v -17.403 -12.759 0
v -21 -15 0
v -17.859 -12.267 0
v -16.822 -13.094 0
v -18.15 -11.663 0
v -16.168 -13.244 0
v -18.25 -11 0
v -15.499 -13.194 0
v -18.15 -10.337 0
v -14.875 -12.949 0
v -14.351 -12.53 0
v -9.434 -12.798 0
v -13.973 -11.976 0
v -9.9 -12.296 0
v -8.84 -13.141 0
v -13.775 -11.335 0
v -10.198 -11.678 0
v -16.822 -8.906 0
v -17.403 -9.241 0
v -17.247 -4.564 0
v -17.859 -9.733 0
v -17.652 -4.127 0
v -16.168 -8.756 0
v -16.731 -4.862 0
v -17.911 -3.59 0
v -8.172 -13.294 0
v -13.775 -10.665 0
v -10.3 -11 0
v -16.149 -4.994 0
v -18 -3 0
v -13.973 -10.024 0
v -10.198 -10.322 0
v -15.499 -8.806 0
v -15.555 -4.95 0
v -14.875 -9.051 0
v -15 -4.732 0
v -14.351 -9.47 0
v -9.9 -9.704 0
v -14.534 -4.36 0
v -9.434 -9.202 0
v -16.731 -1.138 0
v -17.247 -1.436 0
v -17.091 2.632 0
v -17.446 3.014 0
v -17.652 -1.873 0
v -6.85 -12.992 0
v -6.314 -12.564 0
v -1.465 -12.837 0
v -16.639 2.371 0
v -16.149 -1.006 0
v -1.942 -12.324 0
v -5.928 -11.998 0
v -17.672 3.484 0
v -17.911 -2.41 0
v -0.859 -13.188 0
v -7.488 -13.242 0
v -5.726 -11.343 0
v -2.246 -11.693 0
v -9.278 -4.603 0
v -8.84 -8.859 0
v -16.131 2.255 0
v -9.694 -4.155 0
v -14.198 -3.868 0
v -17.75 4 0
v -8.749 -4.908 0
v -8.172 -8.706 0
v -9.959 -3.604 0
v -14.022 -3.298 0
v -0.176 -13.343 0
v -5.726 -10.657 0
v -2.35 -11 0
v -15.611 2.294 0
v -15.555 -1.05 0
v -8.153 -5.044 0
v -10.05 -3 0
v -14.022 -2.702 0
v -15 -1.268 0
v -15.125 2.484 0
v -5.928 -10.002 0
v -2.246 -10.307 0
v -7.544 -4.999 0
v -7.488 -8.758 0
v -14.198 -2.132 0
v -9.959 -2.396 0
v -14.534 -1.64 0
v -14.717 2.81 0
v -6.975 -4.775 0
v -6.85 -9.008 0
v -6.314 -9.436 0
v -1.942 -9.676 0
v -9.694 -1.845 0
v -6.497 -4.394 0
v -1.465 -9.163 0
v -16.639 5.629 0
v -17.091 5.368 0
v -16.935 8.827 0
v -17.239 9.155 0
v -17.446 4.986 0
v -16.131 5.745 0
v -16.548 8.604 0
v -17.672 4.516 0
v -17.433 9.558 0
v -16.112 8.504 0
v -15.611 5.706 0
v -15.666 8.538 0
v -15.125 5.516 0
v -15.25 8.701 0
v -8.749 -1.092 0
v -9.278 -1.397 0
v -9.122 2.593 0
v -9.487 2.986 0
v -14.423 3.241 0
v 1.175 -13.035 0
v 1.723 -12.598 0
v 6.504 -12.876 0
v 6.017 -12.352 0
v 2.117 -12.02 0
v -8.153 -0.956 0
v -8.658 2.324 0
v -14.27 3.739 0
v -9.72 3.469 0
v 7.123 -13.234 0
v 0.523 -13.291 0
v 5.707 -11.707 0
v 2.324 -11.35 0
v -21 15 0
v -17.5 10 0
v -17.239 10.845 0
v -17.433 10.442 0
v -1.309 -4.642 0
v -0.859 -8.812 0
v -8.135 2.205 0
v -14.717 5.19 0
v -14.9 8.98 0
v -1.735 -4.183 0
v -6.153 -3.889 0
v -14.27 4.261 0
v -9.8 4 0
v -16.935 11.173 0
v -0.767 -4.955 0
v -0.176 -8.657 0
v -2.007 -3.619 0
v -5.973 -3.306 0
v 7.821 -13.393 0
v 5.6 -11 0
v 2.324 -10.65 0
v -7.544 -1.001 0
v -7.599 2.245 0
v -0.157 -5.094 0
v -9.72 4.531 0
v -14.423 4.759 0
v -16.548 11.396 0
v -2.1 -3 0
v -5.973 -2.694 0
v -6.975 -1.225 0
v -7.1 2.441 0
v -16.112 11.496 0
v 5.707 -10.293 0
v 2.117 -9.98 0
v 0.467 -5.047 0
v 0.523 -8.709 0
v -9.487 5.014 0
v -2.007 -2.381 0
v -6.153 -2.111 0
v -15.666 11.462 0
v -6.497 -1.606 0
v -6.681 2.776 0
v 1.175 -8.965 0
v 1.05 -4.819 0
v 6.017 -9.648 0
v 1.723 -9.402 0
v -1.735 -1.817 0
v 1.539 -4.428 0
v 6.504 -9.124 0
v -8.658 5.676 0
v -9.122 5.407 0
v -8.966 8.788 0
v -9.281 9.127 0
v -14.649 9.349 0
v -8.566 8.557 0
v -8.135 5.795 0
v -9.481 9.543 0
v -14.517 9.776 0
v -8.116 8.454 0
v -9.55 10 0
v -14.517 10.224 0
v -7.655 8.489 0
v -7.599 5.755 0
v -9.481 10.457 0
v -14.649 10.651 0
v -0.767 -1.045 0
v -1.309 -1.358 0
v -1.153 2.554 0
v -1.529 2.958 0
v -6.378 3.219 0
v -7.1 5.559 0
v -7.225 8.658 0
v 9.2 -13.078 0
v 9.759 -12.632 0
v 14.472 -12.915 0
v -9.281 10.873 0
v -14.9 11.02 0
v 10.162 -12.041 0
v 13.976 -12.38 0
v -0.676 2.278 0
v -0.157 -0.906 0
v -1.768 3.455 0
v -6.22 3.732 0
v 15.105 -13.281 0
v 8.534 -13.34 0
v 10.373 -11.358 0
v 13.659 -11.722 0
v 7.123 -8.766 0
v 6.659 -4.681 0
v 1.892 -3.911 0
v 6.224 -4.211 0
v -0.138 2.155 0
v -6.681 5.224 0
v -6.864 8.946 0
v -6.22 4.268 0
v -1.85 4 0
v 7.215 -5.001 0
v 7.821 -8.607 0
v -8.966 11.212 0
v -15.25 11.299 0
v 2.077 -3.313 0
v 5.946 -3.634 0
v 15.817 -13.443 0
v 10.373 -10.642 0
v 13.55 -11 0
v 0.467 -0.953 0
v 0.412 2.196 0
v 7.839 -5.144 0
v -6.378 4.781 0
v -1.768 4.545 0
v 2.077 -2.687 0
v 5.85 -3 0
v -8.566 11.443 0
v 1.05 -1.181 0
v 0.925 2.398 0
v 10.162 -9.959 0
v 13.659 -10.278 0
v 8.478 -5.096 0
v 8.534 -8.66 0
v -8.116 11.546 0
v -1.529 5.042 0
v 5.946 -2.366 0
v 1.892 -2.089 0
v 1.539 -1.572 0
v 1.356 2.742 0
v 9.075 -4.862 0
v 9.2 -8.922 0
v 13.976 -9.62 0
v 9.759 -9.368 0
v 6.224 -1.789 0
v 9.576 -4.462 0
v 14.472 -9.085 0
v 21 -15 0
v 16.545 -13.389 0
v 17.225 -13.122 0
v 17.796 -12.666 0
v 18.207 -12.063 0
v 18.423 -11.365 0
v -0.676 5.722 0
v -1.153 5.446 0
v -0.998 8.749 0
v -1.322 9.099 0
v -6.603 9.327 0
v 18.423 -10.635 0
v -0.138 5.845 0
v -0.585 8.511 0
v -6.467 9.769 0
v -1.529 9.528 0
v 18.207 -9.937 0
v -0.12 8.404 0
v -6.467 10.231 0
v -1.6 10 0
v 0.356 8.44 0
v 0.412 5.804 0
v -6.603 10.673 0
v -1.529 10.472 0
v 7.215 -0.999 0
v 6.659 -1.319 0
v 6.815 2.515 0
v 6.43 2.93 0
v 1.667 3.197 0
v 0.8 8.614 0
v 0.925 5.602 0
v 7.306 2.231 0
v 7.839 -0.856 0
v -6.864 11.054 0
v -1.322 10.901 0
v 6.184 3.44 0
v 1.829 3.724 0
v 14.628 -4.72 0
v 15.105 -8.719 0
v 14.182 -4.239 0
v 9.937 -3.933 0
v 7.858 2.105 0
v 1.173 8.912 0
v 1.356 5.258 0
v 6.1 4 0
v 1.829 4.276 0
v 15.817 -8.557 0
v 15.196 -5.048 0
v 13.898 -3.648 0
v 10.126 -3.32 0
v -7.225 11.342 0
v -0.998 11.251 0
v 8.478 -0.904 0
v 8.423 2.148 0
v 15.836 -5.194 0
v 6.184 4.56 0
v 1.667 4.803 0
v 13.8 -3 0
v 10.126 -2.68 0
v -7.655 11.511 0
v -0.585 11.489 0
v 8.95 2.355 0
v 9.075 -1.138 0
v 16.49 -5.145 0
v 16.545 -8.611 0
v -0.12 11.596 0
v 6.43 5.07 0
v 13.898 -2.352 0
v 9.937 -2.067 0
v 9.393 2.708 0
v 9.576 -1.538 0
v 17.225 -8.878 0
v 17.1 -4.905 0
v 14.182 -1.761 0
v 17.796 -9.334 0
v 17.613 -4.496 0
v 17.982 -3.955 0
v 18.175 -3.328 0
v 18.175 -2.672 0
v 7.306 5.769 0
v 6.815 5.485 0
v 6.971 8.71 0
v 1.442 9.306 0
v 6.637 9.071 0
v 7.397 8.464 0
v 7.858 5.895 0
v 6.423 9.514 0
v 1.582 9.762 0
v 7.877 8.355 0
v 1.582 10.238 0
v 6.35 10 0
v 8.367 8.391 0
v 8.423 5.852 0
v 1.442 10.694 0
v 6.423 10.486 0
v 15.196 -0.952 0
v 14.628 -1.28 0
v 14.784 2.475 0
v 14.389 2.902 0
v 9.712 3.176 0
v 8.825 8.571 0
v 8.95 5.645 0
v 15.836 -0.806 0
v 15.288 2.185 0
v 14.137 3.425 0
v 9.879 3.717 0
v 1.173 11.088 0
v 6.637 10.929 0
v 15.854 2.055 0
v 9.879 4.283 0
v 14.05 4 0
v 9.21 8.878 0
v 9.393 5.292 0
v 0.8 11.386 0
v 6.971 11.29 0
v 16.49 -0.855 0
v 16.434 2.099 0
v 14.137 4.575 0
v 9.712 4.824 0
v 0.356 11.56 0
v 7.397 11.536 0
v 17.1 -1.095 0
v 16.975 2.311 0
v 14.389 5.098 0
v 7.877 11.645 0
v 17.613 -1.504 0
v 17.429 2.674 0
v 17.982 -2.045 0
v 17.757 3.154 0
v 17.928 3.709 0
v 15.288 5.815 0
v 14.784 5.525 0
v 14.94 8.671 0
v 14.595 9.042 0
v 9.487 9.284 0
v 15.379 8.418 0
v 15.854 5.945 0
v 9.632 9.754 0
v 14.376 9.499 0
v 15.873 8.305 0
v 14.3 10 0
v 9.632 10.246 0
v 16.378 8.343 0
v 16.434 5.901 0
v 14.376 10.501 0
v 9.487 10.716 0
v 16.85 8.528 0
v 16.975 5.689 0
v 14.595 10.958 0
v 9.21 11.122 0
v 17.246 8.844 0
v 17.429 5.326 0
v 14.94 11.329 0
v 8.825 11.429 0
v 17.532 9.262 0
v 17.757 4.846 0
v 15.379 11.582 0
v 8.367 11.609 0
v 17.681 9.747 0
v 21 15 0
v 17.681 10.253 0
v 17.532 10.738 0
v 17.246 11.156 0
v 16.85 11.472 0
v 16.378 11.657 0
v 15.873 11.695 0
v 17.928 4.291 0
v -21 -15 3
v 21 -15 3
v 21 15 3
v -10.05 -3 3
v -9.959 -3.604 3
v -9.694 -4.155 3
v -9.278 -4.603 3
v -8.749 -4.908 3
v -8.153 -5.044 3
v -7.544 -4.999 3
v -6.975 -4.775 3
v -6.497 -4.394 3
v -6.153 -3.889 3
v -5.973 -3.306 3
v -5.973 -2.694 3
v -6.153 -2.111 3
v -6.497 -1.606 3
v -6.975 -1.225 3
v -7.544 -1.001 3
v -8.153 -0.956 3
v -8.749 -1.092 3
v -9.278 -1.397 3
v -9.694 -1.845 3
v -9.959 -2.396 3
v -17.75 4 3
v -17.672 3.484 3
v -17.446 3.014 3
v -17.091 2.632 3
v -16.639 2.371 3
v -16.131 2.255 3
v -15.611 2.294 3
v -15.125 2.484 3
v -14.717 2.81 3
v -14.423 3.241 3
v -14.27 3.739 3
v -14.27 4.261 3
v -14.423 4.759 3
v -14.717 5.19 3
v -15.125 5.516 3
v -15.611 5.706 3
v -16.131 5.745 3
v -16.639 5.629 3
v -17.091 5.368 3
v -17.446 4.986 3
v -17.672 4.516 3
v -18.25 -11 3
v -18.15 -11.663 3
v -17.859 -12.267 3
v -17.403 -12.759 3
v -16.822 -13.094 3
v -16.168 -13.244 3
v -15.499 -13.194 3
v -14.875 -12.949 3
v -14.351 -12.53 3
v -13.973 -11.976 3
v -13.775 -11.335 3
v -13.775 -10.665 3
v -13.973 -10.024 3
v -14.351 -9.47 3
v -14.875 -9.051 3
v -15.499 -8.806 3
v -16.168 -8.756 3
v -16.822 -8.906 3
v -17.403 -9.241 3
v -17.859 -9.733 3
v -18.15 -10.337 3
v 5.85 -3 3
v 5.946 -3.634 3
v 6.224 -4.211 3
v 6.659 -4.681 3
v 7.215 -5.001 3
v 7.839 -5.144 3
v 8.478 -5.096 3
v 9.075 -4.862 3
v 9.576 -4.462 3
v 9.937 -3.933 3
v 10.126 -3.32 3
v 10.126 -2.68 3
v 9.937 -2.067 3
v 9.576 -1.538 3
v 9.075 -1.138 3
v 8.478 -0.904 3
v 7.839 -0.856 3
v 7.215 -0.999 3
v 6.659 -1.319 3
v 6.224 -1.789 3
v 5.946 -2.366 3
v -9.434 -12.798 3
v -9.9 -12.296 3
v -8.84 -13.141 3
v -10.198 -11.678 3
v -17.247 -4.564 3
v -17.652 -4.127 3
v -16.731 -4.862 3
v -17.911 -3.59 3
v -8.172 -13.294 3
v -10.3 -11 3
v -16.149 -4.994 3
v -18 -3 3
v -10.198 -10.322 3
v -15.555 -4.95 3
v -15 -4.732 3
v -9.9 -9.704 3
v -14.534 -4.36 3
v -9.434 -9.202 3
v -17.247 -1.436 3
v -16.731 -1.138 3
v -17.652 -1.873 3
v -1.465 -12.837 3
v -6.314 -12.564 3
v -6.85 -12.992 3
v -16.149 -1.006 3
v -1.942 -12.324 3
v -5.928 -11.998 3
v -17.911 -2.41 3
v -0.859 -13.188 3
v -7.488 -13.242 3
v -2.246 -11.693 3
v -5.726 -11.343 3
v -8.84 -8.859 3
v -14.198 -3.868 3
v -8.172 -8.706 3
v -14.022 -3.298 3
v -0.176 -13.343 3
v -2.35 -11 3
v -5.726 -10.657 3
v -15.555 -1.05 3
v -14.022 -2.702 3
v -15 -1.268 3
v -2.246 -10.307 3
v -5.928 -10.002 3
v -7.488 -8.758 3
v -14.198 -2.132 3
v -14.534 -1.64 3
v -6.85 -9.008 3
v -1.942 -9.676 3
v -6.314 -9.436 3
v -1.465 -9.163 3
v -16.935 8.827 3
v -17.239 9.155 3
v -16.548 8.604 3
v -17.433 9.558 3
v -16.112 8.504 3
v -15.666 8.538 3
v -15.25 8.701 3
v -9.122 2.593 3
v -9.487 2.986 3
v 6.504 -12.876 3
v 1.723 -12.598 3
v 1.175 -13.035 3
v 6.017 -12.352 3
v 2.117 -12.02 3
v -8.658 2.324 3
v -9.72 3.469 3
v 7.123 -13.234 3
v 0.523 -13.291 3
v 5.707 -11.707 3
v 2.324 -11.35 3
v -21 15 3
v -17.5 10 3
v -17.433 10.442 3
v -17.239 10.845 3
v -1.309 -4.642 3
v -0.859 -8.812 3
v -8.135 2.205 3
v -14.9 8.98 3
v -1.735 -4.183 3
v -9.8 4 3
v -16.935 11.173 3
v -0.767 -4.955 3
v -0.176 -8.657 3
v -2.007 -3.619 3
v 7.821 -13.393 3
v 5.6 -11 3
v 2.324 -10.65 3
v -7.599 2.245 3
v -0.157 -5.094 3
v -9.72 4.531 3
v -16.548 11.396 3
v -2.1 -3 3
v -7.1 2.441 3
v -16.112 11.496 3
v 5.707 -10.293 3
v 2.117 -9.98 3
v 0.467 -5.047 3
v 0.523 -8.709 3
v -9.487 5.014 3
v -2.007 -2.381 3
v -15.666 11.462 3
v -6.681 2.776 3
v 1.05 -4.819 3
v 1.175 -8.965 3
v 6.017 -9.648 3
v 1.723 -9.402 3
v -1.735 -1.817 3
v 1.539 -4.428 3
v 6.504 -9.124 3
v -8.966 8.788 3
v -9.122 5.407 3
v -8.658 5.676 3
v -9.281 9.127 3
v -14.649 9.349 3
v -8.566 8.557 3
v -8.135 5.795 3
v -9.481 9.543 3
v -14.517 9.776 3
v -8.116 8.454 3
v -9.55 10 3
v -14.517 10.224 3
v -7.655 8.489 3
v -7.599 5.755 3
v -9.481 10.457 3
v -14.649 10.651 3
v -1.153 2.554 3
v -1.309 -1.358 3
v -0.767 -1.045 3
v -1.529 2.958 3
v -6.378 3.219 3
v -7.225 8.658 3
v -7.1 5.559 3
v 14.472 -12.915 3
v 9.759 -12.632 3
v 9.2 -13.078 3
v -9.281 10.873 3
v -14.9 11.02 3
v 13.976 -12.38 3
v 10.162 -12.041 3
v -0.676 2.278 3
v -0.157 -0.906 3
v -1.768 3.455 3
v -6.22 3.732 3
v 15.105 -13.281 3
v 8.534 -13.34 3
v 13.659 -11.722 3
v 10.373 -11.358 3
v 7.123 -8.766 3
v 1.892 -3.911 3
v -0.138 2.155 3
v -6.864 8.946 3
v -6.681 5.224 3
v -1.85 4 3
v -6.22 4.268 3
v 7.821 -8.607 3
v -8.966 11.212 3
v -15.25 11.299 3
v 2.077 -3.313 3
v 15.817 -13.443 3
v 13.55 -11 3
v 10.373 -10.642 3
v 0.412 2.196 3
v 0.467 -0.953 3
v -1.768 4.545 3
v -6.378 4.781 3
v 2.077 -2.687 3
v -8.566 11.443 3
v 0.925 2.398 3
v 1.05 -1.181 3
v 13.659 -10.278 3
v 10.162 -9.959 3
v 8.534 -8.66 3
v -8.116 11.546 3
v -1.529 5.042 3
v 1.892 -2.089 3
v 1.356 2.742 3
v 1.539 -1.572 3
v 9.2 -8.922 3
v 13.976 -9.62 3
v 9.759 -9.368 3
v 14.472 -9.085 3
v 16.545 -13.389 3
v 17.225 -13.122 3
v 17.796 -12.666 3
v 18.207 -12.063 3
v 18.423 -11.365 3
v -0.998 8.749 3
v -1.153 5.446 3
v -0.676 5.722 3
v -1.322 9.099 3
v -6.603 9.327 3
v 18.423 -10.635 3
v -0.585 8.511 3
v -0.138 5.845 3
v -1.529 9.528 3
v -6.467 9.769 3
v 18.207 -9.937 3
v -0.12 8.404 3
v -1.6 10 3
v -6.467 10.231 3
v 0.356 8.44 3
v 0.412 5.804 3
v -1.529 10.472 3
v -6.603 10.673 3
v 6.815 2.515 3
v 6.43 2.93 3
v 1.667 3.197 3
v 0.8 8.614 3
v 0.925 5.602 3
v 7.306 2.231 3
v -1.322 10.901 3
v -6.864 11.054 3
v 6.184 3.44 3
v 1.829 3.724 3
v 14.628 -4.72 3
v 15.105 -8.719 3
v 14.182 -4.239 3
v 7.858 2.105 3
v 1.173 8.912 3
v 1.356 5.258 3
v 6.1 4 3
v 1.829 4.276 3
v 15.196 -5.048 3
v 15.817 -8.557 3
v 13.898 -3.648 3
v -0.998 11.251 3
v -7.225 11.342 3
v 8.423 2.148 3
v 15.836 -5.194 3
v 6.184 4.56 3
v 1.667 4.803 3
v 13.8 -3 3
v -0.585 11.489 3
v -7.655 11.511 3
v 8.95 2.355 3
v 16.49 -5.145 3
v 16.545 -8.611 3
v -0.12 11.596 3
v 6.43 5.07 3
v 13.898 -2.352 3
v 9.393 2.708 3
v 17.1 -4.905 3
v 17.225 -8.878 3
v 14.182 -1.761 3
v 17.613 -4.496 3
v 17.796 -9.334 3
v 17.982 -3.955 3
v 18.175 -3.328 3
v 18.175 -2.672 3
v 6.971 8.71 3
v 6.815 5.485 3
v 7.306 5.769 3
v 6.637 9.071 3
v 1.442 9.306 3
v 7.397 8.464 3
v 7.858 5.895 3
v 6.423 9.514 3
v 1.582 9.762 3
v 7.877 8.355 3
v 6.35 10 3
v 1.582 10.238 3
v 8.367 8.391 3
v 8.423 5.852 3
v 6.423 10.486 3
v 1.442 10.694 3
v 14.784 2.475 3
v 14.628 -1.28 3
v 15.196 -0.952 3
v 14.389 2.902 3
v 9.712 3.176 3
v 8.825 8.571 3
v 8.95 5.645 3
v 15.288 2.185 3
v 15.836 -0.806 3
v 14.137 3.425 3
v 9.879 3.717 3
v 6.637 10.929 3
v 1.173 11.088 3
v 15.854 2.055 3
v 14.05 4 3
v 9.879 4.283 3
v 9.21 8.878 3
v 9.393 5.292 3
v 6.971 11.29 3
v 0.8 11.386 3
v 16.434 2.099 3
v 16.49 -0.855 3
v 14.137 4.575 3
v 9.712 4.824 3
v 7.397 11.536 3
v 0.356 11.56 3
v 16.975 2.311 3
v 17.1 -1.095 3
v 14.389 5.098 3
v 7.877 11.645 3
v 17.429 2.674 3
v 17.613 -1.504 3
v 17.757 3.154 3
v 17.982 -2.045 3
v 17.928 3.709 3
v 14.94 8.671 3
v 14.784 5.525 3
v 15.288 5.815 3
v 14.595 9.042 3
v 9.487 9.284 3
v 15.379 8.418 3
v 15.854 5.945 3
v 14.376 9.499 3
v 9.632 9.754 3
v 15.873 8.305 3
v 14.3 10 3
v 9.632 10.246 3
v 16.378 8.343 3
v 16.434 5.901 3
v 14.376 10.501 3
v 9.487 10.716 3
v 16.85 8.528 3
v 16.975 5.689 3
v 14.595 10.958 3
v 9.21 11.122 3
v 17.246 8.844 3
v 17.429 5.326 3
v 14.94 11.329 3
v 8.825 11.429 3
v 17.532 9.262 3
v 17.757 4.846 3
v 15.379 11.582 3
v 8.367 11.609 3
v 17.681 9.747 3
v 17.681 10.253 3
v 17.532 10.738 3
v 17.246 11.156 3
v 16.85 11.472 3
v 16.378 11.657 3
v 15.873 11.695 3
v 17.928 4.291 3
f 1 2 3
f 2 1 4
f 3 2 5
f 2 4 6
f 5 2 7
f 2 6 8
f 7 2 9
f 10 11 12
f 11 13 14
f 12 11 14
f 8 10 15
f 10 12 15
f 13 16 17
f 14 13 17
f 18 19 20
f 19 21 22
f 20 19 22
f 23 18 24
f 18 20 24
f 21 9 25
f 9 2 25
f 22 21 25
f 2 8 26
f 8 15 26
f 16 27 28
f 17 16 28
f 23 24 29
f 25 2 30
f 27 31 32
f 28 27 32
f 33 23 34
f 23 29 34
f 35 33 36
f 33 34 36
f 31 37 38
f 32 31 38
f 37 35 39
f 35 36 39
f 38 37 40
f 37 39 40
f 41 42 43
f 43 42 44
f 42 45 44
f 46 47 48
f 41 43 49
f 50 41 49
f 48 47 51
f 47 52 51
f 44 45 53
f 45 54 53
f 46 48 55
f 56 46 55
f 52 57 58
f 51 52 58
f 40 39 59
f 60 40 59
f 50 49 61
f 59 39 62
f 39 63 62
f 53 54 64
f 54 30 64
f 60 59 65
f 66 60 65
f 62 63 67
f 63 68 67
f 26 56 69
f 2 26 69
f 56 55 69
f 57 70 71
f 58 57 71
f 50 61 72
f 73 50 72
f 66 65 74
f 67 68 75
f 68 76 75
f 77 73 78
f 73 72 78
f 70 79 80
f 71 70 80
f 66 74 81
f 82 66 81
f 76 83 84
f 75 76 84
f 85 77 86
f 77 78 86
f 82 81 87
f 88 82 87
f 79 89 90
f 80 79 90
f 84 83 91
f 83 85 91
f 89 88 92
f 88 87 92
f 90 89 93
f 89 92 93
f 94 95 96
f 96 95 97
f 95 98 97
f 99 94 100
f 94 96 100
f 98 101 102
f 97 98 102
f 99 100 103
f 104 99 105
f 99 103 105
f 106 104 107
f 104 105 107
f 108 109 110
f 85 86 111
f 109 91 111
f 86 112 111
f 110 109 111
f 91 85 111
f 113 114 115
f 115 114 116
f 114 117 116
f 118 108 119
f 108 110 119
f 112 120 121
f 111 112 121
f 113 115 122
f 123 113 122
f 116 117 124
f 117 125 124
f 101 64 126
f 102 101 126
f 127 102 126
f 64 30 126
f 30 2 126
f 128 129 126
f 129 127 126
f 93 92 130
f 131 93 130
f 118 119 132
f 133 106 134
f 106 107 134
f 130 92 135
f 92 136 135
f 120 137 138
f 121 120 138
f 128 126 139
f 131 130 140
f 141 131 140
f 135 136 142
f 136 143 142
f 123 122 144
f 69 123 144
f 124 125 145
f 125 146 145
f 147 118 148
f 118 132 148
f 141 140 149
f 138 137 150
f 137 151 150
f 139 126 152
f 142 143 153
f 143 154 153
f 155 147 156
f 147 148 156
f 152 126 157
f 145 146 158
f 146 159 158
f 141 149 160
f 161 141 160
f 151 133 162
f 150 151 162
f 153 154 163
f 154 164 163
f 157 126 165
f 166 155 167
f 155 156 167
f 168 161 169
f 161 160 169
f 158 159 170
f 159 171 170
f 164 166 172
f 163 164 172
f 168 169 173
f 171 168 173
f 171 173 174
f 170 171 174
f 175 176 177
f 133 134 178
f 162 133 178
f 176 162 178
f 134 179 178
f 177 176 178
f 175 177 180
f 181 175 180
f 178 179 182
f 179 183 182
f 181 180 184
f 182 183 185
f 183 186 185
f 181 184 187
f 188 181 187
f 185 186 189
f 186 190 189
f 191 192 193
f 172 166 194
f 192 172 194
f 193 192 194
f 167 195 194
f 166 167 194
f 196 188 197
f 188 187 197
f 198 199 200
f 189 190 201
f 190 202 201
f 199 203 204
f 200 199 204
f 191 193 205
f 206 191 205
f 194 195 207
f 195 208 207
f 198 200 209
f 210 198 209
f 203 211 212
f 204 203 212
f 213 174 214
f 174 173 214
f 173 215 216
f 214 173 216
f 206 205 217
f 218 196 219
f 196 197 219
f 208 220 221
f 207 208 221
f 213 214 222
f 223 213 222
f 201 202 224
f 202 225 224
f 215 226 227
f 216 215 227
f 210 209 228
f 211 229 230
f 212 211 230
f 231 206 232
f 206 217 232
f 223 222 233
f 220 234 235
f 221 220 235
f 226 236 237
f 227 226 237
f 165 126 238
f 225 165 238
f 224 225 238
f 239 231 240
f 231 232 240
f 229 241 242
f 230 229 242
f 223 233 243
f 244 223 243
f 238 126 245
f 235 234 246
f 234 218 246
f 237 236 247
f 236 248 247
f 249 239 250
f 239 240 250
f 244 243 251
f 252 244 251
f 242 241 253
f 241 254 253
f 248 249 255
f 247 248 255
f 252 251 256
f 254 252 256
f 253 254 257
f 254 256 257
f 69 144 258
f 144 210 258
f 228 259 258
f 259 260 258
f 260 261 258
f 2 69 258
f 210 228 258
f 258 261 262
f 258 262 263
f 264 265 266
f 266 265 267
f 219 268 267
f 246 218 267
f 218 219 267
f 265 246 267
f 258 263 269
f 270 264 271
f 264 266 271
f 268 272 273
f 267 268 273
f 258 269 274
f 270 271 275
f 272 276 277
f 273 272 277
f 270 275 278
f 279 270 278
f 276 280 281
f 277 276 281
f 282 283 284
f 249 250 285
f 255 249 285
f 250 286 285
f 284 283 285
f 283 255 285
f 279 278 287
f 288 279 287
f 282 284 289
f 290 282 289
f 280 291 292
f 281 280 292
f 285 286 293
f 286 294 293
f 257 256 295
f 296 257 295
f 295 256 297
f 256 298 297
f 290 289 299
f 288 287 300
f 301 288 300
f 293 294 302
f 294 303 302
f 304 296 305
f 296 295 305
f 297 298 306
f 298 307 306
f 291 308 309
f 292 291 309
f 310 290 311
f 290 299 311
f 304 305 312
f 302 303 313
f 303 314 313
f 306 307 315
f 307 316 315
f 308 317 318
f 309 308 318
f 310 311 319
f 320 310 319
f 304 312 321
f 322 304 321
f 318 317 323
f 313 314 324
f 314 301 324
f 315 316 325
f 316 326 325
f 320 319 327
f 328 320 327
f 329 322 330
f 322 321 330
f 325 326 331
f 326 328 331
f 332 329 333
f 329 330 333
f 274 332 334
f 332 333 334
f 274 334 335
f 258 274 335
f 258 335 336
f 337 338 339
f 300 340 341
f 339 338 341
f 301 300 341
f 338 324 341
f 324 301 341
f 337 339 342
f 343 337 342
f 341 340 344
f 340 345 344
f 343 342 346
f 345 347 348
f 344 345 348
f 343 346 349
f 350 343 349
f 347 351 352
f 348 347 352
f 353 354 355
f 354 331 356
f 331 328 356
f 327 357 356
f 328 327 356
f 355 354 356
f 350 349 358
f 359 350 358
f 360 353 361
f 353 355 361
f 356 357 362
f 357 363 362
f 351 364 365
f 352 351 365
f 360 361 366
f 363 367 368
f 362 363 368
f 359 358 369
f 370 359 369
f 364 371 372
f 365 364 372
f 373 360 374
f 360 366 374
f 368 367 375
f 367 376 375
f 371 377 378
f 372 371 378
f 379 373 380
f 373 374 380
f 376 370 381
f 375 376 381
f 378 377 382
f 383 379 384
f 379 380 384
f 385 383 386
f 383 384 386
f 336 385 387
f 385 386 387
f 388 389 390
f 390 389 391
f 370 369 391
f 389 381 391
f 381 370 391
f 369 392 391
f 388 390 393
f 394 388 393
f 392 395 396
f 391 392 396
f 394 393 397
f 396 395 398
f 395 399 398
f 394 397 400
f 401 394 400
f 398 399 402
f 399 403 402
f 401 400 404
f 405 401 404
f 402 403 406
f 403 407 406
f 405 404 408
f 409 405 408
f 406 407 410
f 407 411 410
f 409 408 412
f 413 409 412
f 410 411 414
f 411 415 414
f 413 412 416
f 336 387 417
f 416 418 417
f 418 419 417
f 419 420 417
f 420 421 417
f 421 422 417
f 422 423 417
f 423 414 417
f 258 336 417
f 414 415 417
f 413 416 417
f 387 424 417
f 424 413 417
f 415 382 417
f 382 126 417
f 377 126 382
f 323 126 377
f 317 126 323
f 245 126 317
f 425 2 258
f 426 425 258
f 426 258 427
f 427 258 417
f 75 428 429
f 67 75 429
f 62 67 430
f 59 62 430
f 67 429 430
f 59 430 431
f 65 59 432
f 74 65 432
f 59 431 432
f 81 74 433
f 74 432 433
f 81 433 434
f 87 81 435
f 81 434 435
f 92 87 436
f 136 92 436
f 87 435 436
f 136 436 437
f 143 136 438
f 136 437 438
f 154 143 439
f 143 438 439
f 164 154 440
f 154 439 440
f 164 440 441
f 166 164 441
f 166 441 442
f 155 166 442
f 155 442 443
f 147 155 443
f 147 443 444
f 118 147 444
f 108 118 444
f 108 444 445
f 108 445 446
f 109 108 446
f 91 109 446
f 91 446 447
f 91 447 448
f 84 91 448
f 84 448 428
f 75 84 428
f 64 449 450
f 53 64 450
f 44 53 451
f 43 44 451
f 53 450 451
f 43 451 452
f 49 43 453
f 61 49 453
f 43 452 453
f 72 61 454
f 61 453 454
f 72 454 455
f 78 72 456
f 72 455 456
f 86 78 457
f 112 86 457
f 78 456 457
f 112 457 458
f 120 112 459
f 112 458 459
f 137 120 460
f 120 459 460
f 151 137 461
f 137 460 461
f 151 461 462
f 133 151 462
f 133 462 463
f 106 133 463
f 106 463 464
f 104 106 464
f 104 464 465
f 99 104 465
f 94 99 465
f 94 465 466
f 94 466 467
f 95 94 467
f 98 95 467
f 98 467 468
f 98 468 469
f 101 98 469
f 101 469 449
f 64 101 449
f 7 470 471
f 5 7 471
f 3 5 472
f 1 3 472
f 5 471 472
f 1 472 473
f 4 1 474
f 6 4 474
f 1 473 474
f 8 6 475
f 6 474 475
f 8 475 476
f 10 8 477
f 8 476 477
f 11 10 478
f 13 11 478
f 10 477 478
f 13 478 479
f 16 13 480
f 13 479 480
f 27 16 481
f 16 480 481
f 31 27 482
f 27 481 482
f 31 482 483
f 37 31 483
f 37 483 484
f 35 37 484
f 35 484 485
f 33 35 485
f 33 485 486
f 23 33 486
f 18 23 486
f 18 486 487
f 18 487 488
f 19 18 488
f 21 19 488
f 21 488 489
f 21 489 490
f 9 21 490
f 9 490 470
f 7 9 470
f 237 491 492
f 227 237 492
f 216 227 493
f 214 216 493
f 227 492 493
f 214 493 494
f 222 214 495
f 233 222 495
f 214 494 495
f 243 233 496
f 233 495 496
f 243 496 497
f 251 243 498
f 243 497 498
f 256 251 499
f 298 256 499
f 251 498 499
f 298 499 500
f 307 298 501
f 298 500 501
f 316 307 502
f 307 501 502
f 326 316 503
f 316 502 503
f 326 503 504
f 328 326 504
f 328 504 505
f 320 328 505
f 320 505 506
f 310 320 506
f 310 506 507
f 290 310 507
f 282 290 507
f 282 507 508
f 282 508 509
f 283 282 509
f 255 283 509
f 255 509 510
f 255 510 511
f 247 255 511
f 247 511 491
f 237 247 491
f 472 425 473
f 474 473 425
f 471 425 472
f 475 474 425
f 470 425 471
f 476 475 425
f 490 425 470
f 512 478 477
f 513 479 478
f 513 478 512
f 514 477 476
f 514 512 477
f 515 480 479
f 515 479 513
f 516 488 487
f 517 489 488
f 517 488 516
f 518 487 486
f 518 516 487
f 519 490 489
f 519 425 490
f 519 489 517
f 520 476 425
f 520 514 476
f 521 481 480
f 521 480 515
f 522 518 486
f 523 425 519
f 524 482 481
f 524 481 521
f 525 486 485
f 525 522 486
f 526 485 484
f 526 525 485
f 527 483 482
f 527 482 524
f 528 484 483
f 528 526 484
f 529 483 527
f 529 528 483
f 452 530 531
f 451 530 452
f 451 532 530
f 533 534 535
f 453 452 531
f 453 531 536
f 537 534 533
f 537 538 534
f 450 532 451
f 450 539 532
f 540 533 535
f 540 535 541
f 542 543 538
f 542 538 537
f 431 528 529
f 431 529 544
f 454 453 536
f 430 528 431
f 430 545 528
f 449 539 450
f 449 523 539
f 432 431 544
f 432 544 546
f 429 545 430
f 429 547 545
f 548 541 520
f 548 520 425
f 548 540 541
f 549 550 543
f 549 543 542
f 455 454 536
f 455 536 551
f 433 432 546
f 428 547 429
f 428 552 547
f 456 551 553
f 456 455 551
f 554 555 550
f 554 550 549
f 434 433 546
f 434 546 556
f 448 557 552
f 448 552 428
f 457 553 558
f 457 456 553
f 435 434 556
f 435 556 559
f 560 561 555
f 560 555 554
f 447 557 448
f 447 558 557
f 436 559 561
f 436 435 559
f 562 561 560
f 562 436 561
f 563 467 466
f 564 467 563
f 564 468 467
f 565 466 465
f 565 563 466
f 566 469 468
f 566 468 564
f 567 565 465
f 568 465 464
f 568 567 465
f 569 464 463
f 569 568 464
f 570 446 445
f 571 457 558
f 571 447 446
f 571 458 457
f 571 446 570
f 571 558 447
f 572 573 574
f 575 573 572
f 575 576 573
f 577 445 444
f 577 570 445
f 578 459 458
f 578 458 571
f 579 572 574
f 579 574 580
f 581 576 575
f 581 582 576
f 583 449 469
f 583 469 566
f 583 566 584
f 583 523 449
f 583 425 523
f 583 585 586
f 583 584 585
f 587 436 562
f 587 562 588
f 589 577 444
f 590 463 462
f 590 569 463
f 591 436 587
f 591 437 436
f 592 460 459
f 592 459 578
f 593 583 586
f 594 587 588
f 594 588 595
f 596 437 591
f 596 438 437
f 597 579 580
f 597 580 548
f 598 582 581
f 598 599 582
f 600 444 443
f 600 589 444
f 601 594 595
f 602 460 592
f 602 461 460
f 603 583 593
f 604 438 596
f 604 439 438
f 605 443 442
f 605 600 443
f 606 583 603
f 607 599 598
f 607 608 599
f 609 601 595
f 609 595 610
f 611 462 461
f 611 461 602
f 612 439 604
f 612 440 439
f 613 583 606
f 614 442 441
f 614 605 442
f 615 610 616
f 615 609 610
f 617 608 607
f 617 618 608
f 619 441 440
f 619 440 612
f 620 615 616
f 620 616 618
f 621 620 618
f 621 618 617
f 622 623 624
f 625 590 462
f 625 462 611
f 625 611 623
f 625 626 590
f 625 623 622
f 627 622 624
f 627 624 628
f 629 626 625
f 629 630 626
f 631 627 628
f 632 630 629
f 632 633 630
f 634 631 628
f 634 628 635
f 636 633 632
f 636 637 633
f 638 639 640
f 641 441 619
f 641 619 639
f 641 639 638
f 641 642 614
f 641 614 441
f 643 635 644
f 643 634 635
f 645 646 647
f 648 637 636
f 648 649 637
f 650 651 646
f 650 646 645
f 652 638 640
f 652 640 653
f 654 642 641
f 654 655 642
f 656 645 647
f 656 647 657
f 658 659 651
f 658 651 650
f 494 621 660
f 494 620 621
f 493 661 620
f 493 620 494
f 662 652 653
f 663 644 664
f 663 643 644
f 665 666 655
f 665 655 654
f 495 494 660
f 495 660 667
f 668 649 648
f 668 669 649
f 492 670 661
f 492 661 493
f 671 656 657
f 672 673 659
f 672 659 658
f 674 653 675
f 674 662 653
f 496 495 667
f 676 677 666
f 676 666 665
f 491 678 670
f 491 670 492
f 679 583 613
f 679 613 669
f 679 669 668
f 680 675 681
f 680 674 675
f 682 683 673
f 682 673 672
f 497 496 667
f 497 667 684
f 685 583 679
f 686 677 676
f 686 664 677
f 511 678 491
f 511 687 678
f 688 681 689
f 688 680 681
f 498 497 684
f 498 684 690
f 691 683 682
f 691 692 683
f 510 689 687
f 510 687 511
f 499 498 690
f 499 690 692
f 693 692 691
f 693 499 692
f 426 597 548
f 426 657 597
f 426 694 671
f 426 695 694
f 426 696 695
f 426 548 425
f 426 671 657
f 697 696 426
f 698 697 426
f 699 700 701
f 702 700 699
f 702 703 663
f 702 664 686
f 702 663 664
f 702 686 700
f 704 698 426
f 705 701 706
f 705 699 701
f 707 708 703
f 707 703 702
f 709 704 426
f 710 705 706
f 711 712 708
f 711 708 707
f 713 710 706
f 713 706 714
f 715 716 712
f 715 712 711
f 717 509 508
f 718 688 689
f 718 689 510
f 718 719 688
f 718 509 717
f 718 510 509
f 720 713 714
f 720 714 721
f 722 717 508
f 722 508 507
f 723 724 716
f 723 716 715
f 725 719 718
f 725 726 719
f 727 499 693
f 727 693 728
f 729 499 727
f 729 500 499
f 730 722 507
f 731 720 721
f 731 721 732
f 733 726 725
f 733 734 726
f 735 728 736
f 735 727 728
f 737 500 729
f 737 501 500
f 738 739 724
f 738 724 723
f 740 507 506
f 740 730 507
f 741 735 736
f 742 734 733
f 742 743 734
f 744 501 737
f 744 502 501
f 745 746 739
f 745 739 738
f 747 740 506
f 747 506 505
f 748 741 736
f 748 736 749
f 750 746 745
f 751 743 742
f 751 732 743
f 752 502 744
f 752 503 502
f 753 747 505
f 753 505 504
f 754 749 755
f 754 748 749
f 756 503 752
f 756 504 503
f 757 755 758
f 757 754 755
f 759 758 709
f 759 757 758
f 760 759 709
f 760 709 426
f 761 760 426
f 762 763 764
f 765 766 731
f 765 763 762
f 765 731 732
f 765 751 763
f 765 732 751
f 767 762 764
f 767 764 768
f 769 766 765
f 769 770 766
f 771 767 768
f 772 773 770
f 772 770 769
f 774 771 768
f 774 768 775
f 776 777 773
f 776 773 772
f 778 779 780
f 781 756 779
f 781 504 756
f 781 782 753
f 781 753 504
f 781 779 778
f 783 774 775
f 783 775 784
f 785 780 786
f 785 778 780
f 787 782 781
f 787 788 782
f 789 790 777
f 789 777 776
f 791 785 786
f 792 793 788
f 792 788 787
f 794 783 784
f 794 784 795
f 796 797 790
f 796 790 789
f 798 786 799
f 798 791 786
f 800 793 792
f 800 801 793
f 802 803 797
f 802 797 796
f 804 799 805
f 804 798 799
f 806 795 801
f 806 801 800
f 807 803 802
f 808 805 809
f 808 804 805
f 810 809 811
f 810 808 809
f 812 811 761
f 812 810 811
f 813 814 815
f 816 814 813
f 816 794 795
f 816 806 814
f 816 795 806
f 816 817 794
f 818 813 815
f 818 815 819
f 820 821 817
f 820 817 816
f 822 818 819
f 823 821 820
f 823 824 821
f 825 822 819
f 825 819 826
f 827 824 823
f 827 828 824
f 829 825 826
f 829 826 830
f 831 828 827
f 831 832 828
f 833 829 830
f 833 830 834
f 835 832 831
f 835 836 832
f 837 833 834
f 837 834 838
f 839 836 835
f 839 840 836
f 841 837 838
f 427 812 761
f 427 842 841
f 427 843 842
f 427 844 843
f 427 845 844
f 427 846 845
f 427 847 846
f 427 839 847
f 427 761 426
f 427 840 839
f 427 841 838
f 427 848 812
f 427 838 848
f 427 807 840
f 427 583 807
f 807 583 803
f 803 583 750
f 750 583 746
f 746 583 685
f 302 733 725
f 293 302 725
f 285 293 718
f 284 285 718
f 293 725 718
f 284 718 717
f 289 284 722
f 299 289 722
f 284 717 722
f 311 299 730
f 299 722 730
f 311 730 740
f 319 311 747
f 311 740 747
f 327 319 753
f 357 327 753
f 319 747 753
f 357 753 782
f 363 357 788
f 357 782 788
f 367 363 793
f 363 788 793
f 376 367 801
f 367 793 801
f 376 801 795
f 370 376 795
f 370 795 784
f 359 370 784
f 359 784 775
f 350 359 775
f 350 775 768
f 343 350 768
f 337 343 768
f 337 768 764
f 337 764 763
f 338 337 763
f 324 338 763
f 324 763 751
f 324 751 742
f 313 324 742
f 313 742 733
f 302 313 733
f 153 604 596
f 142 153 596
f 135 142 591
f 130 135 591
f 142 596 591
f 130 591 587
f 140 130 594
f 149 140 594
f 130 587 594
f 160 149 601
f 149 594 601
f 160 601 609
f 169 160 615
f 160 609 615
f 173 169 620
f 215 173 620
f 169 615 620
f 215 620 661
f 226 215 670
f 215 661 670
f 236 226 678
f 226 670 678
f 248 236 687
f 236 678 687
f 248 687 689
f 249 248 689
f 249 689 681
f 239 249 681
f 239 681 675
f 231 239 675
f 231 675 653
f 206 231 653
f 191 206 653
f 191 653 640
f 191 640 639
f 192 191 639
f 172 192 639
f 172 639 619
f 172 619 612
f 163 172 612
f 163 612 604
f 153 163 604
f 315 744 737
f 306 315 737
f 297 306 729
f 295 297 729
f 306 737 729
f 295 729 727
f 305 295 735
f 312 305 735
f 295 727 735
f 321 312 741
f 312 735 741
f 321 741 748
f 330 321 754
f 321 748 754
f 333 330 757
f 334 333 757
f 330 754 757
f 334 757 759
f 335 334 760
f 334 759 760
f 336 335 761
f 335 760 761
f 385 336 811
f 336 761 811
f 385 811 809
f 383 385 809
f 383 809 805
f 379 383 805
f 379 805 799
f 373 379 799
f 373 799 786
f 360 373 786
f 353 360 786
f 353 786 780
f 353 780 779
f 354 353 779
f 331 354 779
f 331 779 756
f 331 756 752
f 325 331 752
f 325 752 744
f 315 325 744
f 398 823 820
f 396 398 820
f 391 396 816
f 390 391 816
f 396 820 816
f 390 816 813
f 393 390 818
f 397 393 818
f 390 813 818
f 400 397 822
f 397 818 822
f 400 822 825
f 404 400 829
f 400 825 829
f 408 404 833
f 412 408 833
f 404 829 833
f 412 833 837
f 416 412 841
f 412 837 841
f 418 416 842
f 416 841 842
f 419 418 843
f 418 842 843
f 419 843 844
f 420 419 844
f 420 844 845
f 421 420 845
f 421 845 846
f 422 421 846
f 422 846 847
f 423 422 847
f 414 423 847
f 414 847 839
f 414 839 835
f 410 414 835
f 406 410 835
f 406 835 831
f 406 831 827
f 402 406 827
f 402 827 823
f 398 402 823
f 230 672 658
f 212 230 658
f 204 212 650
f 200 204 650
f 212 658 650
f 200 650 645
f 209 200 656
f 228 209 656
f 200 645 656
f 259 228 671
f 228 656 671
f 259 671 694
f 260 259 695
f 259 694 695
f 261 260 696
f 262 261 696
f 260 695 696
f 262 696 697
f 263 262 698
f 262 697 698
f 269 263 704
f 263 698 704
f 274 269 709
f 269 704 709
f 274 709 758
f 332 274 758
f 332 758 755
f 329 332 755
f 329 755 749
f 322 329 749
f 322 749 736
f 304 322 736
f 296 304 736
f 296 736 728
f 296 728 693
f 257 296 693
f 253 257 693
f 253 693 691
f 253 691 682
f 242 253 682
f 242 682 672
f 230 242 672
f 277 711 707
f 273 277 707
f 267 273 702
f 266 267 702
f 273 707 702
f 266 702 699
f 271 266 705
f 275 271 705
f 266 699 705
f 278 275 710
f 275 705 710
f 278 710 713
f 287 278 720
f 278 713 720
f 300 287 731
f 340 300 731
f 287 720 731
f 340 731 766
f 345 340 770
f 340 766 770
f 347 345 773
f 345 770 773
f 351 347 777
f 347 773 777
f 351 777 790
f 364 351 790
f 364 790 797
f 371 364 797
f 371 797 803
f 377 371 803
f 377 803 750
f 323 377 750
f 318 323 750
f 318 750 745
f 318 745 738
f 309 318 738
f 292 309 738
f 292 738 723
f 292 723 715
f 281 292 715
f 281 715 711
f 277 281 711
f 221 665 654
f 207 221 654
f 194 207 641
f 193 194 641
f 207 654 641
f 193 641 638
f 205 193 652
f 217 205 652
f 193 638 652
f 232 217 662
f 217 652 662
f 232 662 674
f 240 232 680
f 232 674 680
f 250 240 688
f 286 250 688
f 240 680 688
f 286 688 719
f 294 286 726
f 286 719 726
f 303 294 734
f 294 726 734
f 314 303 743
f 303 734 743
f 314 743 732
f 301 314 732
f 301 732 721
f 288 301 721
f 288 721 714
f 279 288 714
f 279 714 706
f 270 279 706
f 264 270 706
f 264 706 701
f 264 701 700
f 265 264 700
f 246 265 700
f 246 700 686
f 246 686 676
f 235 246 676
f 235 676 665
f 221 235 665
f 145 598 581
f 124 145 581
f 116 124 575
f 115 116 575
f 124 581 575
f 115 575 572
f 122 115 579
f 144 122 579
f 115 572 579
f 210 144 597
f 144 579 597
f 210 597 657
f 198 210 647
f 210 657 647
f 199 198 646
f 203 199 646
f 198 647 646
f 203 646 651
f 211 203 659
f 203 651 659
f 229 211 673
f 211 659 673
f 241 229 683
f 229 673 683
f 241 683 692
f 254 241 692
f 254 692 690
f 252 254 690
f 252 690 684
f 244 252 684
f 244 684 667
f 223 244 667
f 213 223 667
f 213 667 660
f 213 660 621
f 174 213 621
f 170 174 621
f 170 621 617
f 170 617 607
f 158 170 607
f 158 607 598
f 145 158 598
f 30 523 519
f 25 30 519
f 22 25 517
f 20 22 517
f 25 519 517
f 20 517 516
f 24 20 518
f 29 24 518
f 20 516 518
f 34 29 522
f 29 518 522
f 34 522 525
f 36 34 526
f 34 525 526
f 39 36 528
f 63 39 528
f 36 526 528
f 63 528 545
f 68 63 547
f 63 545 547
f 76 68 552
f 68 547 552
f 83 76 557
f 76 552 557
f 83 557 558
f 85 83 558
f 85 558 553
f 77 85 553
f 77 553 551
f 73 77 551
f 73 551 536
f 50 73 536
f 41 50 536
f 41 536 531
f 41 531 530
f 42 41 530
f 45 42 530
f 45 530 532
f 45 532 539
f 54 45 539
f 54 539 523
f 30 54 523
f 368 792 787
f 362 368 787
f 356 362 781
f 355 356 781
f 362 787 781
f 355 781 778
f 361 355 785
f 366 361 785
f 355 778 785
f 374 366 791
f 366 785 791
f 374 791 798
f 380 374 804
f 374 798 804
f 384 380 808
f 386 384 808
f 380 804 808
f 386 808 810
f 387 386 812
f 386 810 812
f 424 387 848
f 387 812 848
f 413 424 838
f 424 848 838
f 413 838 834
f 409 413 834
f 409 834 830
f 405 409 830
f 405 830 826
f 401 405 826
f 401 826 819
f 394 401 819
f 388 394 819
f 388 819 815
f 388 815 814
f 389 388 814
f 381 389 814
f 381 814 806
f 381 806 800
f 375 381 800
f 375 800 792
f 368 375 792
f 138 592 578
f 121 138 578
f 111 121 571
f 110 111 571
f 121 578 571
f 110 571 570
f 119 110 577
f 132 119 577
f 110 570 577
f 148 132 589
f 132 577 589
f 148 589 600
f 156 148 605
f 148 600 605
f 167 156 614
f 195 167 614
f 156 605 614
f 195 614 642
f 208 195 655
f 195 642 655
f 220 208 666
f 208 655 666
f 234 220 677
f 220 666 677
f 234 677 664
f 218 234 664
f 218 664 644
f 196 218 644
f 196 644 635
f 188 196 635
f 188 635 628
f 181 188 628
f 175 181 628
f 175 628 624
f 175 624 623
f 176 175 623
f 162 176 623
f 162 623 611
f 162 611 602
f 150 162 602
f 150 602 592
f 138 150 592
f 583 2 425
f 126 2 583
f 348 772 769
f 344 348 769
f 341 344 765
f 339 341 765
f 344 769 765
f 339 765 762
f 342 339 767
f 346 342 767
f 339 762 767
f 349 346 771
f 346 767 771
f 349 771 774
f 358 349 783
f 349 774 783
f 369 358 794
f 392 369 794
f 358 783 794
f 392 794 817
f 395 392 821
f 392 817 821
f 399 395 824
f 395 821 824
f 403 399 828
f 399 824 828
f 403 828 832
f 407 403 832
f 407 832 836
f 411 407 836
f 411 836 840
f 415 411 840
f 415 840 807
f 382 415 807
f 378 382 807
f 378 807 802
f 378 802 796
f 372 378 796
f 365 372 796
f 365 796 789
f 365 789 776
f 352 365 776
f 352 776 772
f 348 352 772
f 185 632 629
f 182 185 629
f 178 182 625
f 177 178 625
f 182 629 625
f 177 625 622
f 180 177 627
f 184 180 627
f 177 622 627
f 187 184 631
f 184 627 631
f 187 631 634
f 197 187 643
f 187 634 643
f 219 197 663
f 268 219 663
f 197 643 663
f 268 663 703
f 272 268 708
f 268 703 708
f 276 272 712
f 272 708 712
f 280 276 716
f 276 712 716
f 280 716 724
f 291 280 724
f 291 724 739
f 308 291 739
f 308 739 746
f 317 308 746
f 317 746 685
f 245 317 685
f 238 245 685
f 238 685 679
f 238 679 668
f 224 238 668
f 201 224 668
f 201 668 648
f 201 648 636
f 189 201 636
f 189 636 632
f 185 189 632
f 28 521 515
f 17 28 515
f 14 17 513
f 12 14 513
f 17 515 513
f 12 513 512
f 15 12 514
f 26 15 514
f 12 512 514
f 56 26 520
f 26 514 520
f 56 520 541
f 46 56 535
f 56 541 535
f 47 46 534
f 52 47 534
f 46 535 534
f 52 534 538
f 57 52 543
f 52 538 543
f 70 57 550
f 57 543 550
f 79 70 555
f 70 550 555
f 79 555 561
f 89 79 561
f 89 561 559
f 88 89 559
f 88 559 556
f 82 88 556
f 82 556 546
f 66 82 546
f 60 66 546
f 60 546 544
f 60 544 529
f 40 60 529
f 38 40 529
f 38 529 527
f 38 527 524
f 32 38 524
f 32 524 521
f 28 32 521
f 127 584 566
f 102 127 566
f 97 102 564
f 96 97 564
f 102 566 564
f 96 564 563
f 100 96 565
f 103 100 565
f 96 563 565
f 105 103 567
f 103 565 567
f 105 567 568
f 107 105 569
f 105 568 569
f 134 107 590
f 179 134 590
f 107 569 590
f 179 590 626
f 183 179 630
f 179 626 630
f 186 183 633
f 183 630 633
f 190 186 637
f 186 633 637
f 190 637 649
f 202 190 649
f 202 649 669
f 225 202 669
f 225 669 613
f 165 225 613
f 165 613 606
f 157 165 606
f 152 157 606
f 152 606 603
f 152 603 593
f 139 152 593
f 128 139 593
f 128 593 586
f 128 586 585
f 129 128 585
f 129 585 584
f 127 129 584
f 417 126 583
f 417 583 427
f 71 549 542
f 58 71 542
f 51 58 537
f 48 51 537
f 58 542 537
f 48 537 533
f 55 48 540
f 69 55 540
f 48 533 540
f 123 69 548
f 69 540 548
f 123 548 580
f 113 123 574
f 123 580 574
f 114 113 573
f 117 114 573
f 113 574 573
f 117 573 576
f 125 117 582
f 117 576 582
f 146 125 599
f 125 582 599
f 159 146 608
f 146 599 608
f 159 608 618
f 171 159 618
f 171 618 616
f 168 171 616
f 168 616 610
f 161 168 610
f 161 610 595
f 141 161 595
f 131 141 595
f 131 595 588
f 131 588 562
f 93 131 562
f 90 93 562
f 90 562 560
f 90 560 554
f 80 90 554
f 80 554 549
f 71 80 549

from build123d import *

# Parameters (mm, degrees)
F0_W     = 42
F0_H     = 30
F1_DEPTH = 3
F2_D     = 3
F3_D     = 3.1
F4_D     = 3.2
F5_D     = 3.3
F6_D     = 3.4
F7_D     = 3.5
F8_D     = 3.6
F9_D     = 3.7
F10_D    = 3.8
F11_D    = 3.9
F12_D    = 4
F13_D    = 4.1
F14_D    = 4.2
F15_D    = 4.3
F16_D    = 4.4
F17_D    = 4.5
F18_D    = 4.6
F19_D    = 4.7
F20_D    = 4.8
F21_D    = 4.9


with BuildPart() as f1:
    # F0 (on Top) → F1 (new body)
    with BuildSketch(Plane.XY):
        Rectangle(F0_W, F0_H)
    extrude(amount=F1_DEPTH)

    # F2 (through all)
    with Locations(Plane(origin=(0, 0, 0), x_dir=(1, 0, 0), z_dir=(0, 0, -1))):
        with Locations((-16, -10)):
            Hole(F2_D / 2)

    # F3 (through all)
    with Locations(Plane(origin=(0, 0, 0), x_dir=(1, 0, 0), z_dir=(0, 0, -1))):
        with Locations((-8, -10)):
            Hole(F3_D / 2)

    # F4 (through all)
    with Locations(Plane(origin=(0, 0, 0), x_dir=(1, 0, 0), z_dir=(0, 0, -1))):
        with Locations((0, -10)):
            Hole(F4_D / 2)

    # F5 (through all)
    with Locations(Plane(origin=(0, 0, 0), x_dir=(1, 0, 0), z_dir=(0, 0, -1))):
        with Locations((8, -10)):
            Hole(F5_D / 2)

    # F6 (through all)
    with Locations(Plane(origin=(0, 0, 0), x_dir=(1, 0, 0), z_dir=(0, 0, -1))):
        with Locations((16, -10)):
            Hole(F6_D / 2)

    # F7 (through all)
    with Locations(Plane(origin=(0, 0, 0), x_dir=(1, 0, 0), z_dir=(0, 0, -1))):
        with Locations((-16, -4)):
            Hole(F7_D / 2)

    # F8 (through all)
    with Locations(Plane(origin=(0, 0, 0), x_dir=(1, 0, 0), z_dir=(0, 0, -1))):
        with Locations((-8, -4)):
            Hole(F8_D / 2)

    # F9 (through all)
    with Locations(Plane(origin=(0, 0, 0), x_dir=(1, 0, 0), z_dir=(0, 0, -1))):
        with Locations((0, -4)):
            Hole(F9_D / 2)

    # F10 (through all)
    with Locations(Plane(origin=(0, 0, 0), x_dir=(1, 0, 0), z_dir=(0, 0, -1))):
        with Locations((8, -4)):
            Hole(F10_D / 2)

    # F11 (through all)
    with Locations(Plane(origin=(0, 0, 0), x_dir=(1, 0, 0), z_dir=(0, 0, -1))):
        with Locations((16, -4)):
            Hole(F11_D / 2)

    # F12 (through all)
    with Locations(Plane(origin=(0, 0, 0), x_dir=(1, 0, 0), z_dir=(0, 0, -1))):
        with Locations((-16, 3)):
            Hole(F12_D / 2)

    # F13 (through all)
    with Locations(Plane(origin=(0, 0, 0), x_dir=(1, 0, 0), z_dir=(0, 0, -1))):
        with Locations((-8, 3)):
            Hole(F13_D / 2)

    # F14 (through all)
    with Locations(Plane(origin=(0, 0, 0), x_dir=(1, 0, 0), z_dir=(0, 0, -1))):
        with Locations((0, 3)):
            Hole(F14_D / 2)

    # F15 (through all)
    with Locations(Plane(origin=(0, 0, 0), x_dir=(1, 0, 0), z_dir=(0, 0, -1))):
        with Locations((8, 3)):
            Hole(F15_D / 2)

    # F16 (through all)
    with Locations(Plane(origin=(0, 0, 0), x_dir=(1, 0, 0), z_dir=(0, 0, -1))):
        with Locations((16, 3)):
            Hole(F16_D / 2)

    # F17 (through all)
    with Locations(Plane(origin=(0, 0, 0), x_dir=(1, 0, 0), z_dir=(0, 0, -1))):
        with Locations((-16, 11)):
            Hole(F17_D / 2)

    # F18 (through all)
    with Locations(Plane(origin=(0, 0, 0), x_dir=(1, 0, 0), z_dir=(0, 0, -1))):
        with Locations((-8, 11)):
            Hole(F18_D / 2)

    # F19 (through all)
    with Locations(Plane(origin=(0, 0, 0), x_dir=(1, 0, 0), z_dir=(0, 0, -1))):
        with Locations((0, 11)):
            Hole(F19_D / 2)

    # F20 (through all)
    with Locations(Plane(origin=(0, 0, 0), x_dir=(1, 0, 0), z_dir=(0, 0, -1))):
        with Locations((8, 11)):
            Hole(F20_D / 2)

    # F21 (through all)
    with Locations(Plane(origin=(0, 0, 0), x_dir=(1, 0, 0), z_dir=(0, 0, -1))):
        with Locations((16, 11)):
            Hole(F21_D / 2)


solid = f1.part
